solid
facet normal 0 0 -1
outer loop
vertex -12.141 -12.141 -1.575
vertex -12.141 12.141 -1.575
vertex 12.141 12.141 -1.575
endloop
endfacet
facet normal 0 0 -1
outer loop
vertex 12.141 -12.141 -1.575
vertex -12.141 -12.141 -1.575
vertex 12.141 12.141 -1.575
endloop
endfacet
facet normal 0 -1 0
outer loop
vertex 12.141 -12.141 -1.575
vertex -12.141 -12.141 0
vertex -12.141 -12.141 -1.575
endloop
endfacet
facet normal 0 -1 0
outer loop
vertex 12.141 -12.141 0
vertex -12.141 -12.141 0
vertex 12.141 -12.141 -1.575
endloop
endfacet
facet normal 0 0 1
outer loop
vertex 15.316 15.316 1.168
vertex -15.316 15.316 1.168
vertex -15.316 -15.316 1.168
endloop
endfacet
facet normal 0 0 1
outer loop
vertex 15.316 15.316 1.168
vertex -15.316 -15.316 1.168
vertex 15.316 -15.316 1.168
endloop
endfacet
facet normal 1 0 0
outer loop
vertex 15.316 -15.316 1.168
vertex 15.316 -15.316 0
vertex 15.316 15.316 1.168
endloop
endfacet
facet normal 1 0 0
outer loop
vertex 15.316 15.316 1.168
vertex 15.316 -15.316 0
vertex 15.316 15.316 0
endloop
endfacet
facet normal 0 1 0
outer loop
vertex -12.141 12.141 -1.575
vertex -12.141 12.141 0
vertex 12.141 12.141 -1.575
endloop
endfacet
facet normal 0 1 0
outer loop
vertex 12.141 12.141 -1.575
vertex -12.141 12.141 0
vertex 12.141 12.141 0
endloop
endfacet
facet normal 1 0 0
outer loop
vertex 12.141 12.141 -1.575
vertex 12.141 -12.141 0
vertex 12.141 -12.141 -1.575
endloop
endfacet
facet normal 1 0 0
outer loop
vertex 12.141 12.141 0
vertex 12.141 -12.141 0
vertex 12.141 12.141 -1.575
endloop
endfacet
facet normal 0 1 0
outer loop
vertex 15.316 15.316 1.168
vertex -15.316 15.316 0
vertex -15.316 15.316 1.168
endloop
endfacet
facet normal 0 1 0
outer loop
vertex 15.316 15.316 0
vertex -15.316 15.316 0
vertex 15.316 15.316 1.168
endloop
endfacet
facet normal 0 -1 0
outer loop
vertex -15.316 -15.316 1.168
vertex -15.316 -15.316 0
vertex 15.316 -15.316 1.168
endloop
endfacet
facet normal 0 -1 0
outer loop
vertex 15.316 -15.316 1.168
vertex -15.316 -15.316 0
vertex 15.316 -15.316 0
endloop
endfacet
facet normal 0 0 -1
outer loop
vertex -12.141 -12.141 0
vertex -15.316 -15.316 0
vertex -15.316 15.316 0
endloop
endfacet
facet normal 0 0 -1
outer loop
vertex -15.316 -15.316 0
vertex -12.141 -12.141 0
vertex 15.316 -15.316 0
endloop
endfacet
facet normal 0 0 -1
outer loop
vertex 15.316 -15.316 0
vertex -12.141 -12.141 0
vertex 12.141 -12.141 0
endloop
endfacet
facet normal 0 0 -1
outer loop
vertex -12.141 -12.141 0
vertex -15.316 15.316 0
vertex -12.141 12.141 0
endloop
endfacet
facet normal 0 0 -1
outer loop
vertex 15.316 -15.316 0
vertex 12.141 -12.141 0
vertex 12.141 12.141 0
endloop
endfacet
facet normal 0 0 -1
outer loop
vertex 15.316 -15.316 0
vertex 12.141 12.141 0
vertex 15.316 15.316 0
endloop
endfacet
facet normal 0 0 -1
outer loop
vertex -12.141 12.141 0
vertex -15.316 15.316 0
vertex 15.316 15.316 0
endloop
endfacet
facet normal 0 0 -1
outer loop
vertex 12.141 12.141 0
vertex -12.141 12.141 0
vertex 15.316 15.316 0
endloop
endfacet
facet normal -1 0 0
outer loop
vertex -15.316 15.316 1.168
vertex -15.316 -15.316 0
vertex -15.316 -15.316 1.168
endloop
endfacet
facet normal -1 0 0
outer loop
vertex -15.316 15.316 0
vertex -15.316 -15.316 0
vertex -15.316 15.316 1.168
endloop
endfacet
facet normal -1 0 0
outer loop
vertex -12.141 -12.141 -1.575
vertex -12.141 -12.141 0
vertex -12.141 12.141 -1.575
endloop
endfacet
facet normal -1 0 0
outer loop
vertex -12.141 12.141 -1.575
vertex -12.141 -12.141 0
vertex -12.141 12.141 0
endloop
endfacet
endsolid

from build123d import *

# Parameters (mm, degrees)
F0_W     = 30.6324
F0_H     = 30.6324
F0_W_2   = 24.2824
F0_H_2   = 24.2824
F1_DEPTH = 1.1684
F2_DEPTH = 1.5748


with BuildPart() as f1:
    # F0 (on Top) → F1 (new body)
    with BuildSketch(Plane.XY):
        Rectangle(F0_W, F0_H)
        Rectangle(F0_W_2, F0_H_2, mode=Mode.SUBTRACT)
        Rectangle(F0_W_2, F0_H_2)
    extrude(amount=F1_DEPTH)

    # F0 (on Top) → F2 (join)
    with BuildSketch(Plane.XY):
        Rectangle(F0_W_2, F0_H_2)
    extrude(amount=-F2_DEPTH)


solid = f1.part
